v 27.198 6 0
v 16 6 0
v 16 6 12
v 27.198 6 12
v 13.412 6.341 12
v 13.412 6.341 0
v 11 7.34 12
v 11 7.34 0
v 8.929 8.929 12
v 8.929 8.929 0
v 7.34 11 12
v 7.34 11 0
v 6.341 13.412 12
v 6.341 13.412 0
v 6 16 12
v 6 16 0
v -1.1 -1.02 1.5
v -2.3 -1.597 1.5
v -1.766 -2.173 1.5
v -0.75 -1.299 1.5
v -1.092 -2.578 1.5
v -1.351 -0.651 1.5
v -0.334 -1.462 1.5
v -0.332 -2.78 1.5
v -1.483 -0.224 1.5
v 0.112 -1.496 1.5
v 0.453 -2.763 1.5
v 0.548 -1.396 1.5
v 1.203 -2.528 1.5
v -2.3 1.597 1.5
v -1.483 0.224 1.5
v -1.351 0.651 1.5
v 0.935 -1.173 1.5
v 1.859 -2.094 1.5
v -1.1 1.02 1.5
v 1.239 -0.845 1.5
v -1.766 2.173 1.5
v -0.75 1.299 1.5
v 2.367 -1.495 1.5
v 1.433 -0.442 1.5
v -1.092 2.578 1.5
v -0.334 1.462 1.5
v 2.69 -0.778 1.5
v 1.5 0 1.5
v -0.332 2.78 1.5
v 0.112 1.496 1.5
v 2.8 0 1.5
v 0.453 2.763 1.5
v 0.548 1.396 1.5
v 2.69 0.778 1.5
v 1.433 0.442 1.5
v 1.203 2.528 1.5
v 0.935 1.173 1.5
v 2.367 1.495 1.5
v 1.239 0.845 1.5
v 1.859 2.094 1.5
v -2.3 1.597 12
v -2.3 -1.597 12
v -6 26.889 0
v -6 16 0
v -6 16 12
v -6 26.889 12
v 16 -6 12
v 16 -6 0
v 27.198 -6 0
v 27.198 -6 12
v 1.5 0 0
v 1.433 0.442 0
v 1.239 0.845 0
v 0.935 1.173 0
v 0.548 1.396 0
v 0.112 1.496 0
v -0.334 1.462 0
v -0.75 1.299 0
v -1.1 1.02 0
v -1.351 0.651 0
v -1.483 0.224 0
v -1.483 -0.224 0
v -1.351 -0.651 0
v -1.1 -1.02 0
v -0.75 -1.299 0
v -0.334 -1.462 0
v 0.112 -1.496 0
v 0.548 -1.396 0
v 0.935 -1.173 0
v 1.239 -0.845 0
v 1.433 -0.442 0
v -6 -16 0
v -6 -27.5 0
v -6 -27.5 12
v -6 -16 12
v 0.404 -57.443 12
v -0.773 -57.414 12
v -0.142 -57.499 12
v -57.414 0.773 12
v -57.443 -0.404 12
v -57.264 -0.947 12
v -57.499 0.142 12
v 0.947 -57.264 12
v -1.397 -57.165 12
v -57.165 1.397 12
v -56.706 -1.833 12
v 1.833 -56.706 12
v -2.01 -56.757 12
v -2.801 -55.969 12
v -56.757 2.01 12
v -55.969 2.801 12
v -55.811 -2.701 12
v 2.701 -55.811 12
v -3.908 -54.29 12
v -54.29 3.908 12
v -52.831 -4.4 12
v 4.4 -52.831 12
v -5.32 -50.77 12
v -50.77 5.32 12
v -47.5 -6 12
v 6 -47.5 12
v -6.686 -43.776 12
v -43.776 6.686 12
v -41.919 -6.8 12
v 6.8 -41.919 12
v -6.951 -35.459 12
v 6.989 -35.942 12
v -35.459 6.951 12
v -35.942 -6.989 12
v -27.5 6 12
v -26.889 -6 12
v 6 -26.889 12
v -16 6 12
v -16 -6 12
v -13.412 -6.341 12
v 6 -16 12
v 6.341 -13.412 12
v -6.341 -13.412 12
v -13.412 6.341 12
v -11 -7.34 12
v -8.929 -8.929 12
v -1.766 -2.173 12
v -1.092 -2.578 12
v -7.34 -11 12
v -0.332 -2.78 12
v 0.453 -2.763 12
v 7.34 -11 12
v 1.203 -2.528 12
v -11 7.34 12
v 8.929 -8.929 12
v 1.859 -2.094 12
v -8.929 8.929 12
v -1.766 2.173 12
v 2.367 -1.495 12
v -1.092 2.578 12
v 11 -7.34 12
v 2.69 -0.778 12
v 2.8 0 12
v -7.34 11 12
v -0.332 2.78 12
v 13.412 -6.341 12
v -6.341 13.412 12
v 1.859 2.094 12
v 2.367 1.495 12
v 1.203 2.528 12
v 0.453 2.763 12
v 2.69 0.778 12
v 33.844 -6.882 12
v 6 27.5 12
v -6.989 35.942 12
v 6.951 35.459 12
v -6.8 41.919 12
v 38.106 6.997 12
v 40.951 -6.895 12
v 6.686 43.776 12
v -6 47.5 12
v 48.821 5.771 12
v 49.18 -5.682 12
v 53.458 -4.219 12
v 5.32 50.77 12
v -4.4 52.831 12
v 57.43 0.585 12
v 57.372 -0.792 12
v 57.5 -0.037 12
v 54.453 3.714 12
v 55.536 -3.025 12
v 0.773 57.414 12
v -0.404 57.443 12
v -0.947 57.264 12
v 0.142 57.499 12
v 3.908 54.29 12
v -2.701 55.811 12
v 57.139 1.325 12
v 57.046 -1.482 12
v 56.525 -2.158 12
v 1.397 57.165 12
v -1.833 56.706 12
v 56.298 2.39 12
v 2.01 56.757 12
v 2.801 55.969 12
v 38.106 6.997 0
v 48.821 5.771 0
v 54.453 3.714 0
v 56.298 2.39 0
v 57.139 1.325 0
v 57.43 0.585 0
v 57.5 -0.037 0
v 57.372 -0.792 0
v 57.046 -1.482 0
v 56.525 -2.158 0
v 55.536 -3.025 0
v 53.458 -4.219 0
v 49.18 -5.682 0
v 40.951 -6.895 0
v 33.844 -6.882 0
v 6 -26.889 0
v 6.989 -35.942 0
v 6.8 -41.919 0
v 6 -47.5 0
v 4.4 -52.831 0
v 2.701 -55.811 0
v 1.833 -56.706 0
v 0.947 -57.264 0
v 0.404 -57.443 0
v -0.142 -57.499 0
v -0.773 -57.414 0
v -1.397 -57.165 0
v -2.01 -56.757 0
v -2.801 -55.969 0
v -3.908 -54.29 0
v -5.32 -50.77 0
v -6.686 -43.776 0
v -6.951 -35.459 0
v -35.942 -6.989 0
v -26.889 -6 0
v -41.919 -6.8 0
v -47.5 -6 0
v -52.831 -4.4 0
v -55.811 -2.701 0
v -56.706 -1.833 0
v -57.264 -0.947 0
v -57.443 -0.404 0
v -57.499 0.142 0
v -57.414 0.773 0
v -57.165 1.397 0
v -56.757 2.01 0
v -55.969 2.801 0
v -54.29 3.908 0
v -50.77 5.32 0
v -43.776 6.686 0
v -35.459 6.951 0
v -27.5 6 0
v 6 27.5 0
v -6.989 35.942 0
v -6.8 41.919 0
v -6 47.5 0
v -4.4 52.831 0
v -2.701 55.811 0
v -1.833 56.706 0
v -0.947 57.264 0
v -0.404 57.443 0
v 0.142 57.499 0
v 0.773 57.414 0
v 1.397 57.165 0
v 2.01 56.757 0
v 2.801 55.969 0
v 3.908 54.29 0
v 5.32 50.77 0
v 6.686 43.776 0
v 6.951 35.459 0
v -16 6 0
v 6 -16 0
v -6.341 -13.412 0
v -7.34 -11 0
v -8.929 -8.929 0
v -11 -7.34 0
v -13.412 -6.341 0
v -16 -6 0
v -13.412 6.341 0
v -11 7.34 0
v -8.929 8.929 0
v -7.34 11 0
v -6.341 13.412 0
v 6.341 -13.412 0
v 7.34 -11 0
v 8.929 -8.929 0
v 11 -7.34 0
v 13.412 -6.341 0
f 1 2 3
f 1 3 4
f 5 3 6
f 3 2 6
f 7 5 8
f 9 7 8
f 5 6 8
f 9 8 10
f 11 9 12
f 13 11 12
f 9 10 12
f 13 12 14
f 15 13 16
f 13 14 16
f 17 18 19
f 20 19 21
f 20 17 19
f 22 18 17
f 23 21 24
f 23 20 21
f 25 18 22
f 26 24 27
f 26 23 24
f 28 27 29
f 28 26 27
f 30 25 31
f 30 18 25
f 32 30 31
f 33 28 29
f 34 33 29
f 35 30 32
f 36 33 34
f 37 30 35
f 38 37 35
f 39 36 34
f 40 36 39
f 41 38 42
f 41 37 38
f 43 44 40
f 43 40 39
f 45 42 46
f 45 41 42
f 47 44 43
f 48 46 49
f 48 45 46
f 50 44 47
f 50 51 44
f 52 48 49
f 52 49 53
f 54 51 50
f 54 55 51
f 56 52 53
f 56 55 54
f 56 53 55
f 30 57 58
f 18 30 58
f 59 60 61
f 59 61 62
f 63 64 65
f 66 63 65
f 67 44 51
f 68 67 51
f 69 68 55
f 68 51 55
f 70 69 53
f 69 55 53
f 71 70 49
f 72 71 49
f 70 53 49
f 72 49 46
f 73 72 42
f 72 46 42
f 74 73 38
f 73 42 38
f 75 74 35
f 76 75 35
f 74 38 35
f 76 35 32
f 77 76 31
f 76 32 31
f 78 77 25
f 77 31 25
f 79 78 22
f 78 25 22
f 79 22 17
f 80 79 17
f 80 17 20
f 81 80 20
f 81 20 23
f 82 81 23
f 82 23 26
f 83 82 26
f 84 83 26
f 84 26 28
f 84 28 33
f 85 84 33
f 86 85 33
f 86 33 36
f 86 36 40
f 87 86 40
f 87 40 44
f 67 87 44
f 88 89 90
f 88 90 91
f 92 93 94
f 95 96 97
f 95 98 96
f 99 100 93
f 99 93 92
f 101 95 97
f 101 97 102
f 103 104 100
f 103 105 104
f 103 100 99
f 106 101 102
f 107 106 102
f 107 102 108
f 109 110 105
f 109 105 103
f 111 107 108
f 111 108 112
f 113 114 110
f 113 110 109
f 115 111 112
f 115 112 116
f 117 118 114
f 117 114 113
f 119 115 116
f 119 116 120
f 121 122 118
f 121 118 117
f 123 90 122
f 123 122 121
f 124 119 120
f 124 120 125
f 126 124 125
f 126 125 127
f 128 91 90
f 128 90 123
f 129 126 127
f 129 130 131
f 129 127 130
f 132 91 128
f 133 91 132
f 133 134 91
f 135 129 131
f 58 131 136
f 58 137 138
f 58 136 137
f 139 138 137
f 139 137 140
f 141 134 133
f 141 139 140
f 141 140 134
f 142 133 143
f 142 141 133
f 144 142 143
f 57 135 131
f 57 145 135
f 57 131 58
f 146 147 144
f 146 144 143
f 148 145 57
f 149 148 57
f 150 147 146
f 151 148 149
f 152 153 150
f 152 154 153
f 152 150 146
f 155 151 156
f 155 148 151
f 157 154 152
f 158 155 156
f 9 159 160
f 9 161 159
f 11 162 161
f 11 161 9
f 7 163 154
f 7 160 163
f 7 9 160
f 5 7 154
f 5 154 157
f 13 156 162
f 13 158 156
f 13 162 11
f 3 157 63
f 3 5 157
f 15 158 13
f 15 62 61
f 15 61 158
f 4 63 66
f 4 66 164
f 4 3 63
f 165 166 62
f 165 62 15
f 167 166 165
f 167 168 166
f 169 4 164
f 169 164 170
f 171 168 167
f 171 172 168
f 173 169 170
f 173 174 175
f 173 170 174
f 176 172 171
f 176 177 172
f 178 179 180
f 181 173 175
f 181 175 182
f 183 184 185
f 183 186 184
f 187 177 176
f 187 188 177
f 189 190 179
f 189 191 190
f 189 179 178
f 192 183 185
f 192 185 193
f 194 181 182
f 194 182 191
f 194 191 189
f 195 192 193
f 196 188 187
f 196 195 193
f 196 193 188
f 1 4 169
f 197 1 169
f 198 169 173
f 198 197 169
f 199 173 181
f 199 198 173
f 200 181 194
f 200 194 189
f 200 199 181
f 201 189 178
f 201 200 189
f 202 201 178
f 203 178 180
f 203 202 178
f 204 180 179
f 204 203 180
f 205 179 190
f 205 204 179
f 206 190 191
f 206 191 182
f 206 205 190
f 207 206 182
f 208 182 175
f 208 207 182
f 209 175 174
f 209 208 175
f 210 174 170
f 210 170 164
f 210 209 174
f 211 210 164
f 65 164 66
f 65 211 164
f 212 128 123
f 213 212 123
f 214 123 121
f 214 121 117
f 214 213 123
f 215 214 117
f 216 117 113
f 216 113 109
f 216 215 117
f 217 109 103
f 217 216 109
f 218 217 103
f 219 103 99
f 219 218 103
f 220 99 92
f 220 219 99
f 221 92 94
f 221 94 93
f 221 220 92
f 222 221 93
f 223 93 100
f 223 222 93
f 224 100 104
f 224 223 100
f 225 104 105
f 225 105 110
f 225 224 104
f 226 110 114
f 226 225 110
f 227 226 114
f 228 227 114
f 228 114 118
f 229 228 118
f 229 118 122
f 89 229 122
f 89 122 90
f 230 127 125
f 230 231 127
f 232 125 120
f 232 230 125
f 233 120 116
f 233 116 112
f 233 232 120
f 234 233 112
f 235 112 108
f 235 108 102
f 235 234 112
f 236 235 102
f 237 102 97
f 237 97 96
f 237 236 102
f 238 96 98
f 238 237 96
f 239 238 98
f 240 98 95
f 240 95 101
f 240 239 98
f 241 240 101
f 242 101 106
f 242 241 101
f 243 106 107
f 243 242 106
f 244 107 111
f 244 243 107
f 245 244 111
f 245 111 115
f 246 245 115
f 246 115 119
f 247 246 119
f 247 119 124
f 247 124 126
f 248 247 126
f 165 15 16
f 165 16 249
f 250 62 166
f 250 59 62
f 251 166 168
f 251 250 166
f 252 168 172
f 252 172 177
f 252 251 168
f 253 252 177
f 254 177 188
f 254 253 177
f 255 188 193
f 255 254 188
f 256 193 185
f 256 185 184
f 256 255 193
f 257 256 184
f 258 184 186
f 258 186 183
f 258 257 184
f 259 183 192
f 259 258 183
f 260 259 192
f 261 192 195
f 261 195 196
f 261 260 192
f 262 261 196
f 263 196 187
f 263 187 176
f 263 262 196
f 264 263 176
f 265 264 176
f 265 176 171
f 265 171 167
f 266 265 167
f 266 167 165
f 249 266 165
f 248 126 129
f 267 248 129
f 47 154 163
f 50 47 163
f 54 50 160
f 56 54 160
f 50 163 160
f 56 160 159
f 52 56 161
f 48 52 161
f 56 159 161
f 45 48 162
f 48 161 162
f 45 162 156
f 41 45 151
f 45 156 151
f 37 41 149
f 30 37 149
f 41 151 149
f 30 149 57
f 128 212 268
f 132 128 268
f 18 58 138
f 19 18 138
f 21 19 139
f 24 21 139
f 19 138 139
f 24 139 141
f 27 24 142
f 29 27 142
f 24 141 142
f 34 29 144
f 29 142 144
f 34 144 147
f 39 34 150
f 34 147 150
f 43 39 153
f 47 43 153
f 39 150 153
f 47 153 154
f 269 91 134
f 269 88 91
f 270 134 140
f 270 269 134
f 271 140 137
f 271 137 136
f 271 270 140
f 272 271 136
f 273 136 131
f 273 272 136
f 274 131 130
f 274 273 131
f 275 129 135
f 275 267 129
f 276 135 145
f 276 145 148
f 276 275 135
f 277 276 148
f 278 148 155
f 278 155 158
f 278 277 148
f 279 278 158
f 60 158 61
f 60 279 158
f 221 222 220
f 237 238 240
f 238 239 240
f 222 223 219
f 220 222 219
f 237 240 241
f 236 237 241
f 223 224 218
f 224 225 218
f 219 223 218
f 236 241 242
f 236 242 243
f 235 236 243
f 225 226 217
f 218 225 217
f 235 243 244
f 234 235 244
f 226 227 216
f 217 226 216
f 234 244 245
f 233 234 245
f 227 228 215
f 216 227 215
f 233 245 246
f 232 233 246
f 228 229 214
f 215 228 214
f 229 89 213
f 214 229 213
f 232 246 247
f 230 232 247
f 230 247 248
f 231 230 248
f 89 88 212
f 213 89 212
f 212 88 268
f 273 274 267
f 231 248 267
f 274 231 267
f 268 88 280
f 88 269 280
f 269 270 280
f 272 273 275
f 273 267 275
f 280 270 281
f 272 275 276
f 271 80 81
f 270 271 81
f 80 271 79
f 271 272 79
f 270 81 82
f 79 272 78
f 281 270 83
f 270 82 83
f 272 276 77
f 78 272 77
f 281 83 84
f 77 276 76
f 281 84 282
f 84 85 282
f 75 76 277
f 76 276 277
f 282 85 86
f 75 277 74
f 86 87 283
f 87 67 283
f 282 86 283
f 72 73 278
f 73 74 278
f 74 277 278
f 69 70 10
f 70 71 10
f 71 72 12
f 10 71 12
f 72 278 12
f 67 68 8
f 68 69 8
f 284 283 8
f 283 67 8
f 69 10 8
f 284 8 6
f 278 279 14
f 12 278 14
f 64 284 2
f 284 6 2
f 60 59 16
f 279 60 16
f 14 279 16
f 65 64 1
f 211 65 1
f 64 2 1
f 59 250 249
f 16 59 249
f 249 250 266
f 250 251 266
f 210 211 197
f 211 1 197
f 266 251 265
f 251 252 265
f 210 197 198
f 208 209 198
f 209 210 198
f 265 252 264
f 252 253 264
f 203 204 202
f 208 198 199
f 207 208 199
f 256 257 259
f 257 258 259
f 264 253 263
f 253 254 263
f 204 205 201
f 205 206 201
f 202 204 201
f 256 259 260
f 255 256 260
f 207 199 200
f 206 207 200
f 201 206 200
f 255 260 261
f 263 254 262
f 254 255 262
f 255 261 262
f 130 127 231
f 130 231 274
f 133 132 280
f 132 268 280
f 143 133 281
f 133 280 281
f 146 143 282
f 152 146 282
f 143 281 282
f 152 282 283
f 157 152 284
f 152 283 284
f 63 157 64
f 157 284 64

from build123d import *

# Parameters (mm, degrees)
SKETCH_2_W          = 95
SKETCH_2_H          = 12
EXTRUDE_2_DEPTH     = 12
SKETCH_7_W          = 12
SKETCH_7_H          = 95
EXTRUDE_6_DEPTH     = 12
SKETCH_5_RX         = 20
SKETCH_5_RY         = 7
SKETCH_5_RY_2       = 7.000177109
EXTRUDE_5_DEPTH     = 12
CUT_EXTRUDE_1_DEPTH = 10.5
FILLET_1_R          = 10
SKETCH_9_R          = 1.5
CUT_EXTRUDE_2_DEPTH = 82.992066392


with BuildPart() as part:
    # 草图2 → 凸台-拉伸2 (new body)
    with BuildSketch(Plane.XY):
        Rectangle(SKETCH_2_W, SKETCH_2_H)
    extrude(amount=EXTRUDE_2_DEPTH)

    # 草图7 → 凸台-拉伸6 (add)
    with BuildSketch(Plane.XY.offset(12)):
        Rectangle(SKETCH_7_W, SKETCH_7_H)
    extrude(amount=-EXTRUDE_6_DEPTH)

    # 草图5 → 凸台-拉伸5 (add)
    with BuildSketch(Plane(origin=(0, 0, 0), x_dir=(-1, 0, 0), z_dir=(0, 0, -1))):
        with Locations(Location((-37.5, 0), (0, 0, 0))):
            Ellipse(SKETCH_5_RX, SKETCH_5_RY)
        with Locations(Location((0, 37.5), (0, 0, 90.407571877))):
            Ellipse(SKETCH_5_RX, SKETCH_5_RY_2)
        with Locations(Location((37.5, 0), (0, 0, 0.407571877))):
            Ellipse(SKETCH_5_RX, SKETCH_5_RY_2)
        with Locations(Location((0, -37.5), (0, 0, -89.592428123))):
            Ellipse(SKETCH_5_RX, SKETCH_5_RY_2)
    extrude(amount=-EXTRUDE_5_DEPTH)

    # 草图8 → 切除-拉伸1 (cut)
    with BuildSketch(Plane.XY.offset(12)):
        with BuildLine():
            ThreePointArc((2.8, 0), (0.836660027, 2.672077843), (-2.3, 1.596871942))
            Line((-2.3, 1.596871942), (-2.3, -1.596871942))
            ThreePointArc((-2.3, -1.596871942), (0.836660027, -2.672077843), (2.8, 0))
        make_face()
    extrude(amount=-CUT_EXTRUDE_1_DEPTH, mode=Mode.SUBTRACT)

    # 圆角1
    fillet_1_edges = [part.edges().sort_by_distance(p)[0] for p in [
        (6, 6, 6),
        (6, -6, 6),
        (-6, 6, 6),
        (-6, -6, 6),
    ]]
    fillet(fillet_1_edges, radius=FILLET_1_R)

    # 草图9 → 切除-拉伸2 (cut, through all)
    with BuildSketch(Plane.XY.offset(1.5)):
        Circle(SKETCH_9_R)
    extrude(amount=-CUT_EXTRUDE_2_DEPTH, mode=Mode.SUBTRACT)


solid = part.part
